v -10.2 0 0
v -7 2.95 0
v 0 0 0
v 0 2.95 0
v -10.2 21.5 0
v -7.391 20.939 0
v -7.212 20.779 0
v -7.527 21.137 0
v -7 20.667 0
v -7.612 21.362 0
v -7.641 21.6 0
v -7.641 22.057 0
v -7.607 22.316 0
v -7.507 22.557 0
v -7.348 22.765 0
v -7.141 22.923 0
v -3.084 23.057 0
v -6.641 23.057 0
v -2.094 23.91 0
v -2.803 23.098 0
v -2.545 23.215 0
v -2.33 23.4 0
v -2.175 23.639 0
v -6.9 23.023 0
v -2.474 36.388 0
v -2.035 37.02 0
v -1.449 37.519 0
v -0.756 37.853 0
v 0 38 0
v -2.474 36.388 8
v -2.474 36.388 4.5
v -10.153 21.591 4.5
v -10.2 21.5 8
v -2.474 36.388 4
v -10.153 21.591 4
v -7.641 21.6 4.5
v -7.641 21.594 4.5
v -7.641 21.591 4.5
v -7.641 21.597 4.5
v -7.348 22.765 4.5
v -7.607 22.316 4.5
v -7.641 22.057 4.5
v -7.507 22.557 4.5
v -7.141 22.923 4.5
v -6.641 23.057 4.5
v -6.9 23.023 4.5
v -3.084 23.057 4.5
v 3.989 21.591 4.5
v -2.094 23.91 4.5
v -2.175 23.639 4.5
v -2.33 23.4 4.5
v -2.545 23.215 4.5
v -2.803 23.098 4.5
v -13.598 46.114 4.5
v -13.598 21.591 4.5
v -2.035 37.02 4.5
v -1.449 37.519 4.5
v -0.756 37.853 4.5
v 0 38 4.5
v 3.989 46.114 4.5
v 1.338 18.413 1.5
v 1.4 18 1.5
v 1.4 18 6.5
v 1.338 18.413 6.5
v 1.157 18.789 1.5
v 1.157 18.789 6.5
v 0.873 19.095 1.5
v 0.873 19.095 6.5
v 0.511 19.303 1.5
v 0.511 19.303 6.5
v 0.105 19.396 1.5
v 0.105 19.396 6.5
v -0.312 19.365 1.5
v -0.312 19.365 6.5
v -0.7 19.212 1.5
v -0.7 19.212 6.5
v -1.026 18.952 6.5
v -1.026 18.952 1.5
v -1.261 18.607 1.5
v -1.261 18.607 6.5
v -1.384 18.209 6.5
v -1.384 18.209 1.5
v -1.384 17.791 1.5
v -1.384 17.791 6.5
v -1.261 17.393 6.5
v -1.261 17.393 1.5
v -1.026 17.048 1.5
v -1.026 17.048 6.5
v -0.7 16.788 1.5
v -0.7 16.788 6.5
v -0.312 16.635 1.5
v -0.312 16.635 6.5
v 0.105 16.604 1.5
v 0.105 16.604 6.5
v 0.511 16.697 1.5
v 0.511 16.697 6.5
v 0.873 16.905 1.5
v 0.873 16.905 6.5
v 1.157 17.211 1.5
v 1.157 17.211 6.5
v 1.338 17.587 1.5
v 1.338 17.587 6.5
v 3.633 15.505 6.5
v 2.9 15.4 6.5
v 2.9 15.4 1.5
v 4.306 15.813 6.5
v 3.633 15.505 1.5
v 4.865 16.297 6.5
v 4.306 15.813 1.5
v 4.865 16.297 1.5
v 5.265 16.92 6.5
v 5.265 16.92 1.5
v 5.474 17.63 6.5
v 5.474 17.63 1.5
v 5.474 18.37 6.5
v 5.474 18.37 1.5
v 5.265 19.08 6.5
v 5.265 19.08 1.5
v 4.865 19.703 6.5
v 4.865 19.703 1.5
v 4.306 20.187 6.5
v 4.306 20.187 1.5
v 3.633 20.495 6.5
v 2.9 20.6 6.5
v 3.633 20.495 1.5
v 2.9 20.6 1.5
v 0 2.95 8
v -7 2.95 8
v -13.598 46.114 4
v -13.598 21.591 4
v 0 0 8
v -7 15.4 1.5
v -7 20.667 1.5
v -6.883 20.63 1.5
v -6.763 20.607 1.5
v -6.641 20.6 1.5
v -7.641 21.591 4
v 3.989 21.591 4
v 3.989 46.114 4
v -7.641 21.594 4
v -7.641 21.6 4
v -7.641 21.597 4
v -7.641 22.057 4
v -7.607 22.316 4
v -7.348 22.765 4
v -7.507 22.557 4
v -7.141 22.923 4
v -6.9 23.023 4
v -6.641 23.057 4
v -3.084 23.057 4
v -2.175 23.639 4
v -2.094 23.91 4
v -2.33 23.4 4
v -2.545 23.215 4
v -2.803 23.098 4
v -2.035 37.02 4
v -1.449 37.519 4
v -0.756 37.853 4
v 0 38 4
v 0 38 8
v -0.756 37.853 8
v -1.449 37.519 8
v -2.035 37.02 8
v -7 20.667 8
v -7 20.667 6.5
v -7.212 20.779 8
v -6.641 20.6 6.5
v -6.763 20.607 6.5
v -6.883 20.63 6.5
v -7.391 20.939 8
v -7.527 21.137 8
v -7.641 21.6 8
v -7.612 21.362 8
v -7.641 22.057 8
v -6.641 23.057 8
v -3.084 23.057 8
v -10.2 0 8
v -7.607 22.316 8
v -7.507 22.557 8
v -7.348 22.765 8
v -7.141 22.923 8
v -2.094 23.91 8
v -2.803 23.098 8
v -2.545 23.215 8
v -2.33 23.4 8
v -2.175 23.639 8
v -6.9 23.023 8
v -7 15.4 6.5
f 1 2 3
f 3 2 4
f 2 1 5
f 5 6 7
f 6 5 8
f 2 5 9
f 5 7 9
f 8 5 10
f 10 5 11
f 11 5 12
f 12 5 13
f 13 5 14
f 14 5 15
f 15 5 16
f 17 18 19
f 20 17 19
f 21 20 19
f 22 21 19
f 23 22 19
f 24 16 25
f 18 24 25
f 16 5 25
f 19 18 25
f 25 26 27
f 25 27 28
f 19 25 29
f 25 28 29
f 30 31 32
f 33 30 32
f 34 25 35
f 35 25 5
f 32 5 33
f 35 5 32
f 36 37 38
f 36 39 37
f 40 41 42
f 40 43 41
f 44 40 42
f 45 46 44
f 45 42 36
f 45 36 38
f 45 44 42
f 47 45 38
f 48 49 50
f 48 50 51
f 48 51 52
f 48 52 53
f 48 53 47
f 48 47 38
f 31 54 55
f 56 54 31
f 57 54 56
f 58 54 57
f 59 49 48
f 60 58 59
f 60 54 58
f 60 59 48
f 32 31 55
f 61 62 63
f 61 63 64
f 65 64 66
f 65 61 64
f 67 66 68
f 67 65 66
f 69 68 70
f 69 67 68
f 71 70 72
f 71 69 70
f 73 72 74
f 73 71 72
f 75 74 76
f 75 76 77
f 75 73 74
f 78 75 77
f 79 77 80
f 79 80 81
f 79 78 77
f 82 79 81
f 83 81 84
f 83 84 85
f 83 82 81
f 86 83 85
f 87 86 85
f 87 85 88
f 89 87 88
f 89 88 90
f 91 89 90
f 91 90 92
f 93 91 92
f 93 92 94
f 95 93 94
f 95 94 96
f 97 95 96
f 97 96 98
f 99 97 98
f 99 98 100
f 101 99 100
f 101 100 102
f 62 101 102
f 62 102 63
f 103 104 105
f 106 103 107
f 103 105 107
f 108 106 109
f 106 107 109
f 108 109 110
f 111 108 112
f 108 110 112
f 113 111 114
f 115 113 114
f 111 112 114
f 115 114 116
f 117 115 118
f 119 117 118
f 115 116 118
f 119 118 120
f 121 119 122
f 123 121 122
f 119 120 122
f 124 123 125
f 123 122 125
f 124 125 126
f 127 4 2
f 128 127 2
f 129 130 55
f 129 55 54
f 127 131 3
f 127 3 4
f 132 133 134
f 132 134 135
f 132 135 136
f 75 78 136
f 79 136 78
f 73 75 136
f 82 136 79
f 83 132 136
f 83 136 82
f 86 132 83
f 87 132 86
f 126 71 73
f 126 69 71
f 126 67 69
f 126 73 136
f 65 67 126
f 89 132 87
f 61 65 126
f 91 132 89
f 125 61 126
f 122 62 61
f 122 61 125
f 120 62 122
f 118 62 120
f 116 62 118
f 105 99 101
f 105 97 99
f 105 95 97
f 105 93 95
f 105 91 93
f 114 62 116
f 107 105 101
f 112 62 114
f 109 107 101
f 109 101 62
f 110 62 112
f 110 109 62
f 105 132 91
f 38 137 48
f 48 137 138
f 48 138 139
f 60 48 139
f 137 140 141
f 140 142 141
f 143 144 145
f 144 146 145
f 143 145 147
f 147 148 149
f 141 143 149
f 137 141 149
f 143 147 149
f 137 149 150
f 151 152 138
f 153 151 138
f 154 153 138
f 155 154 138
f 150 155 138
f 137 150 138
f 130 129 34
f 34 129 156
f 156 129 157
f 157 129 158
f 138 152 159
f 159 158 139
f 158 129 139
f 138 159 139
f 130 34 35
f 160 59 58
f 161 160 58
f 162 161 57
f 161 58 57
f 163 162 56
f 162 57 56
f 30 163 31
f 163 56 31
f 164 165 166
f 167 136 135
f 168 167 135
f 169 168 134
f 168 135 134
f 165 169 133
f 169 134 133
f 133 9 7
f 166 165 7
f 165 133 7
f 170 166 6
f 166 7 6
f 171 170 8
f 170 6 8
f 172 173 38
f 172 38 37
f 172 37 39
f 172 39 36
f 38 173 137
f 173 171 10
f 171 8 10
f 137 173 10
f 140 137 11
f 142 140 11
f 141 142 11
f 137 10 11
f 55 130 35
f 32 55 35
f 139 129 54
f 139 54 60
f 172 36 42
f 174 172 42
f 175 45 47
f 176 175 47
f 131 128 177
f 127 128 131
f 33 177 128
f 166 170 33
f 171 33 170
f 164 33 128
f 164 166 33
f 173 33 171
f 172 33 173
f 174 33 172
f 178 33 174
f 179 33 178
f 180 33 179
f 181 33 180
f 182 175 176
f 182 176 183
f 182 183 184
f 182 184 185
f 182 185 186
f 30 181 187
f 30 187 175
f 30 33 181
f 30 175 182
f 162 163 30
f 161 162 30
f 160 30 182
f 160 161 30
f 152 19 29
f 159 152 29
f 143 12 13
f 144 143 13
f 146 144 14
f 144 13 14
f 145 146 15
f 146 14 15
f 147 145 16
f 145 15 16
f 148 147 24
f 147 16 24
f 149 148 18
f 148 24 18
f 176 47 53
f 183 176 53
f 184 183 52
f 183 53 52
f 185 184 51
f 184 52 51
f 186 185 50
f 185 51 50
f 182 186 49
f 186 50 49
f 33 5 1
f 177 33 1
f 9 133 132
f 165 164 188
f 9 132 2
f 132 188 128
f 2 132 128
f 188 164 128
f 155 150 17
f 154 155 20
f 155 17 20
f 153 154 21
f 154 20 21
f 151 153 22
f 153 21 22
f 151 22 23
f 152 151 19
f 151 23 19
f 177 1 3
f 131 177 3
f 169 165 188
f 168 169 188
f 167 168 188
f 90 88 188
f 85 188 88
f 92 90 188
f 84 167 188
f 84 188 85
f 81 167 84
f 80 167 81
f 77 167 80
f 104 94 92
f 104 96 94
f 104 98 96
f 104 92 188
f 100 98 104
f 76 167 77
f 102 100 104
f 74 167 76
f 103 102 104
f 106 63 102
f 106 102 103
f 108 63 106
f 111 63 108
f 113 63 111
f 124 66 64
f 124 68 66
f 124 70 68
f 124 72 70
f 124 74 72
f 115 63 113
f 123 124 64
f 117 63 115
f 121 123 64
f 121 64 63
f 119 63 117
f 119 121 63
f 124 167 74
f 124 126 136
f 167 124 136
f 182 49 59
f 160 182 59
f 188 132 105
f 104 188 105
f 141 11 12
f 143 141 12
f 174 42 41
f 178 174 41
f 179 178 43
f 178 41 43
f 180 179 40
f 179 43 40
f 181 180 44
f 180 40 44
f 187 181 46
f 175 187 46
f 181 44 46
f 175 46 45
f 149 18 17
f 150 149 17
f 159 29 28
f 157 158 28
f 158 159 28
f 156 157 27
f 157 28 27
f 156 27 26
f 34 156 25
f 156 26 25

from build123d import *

# Parameters (mm, degrees)
F0_R     = 1.4
F1_DEPTH = 8
F3_W     = 17.5872370601
F3_H     = 24.5230514556
F4_DEPTH = 0.5
F5_R     = 1.4
F6_DEPTH = 1.5
F7_R     = 1.4
F8_DEPTH = 1.5


with BuildPart() as f1:
    # F0 (on Top) → F1 (new body)
    with BuildSketch(Plane.XY):
        with BuildLine():
            Line((-10.2, 0), (0, 0))
            Line((0, 0), (0, 2.95))
            Line((0, 2.95), (-7, 2.95))
            Line((-7, 2.95), (-7, 15.4))
            Line((-7, 15.4), (2.9, 15.4))
            ThreePointArc((2.9, 15.4), (5.5, 18), (2.9, 20.6))
            Line((2.9, 20.6), (-6.6411852492, 20.6))
            ThreePointArc((-6.6411852492, 20.6), (-7.3482920304, 20.8928932188), (-7.6411852492, 21.6))
            Line((-7.6411852492, 21.6), (-7.6411852492, 22.0574738234))
            ThreePointArc((-7.6411852492, 22.0574738234), (-7.3482920304, 22.7645806046), (-6.6411852492, 23.0574738234))
            Line((-6.6411852492, 23.0574738234), (-3.0835396533, 23.0574738234))
            ThreePointArc((-3.0835396533, 23.0574738234), (-2.4304830107, 23.3001647574), (-2.0944082211, 23.9104397804))
            Line((-2.0944082211, 23.9104397804), (0, 38))
            ThreePointArc((0, 38), (-1.4489432485, 37.5193323495), (-2.4737455949, 36.3878474497))
            Line((-2.4737455949, 36.3878474497), (-10.2, 21.5))
            Line((-10.2, 21.5), (-10.2, 2.95))
            Line((-10.2, 2.95), (-10.2, 0))
        make_face()
        with Locations((0, 18)):
            Circle(F0_R, mode=Mode.SUBTRACT)
    extrude(amount=F1_DEPTH)

    # F3 (on mid) → F4 (join)
    with BuildSketch(Plane.XY.offset(4)):
        with Locations((-4.8047471792, 33.8525986299)):
            Rectangle(F3_W, F3_H)
    extrude(amount=F4_DEPTH)

    # F5 (on face) → F6 (cut)
    with BuildSketch(Plane.XY.offset(8)):
        with BuildLine():
            Line((-7, 20.6665912071), (-7, 15.4))
            Line((-7, 15.4), (2.9, 15.4))
            ThreePointArc((2.9, 15.4), (5.5, 18), (2.9, 20.6))
            Line((2.9, 20.6), (-6.6411852492, 20.6))
            ThreePointArc((-6.6411852492, 20.6), (-6.8236560785, 20.6167887326), (-7, 20.6665912071))
        make_face()
        with Locations((0, 18)):
            Circle(F5_R, mode=Mode.SUBTRACT)
    extrude(amount=-F6_DEPTH, mode=Mode.SUBTRACT)

    # F7 (on face) → F8 (cut)
    with BuildSketch(Plane(origin=(0, 0, 0), x_dir=(1, 0, 0), z_dir=(0, 0, -1))):
        with BuildLine():
            Line((2.9, -15.4), (-7, -15.4))
            Line((-7, -15.4), (-7, -20.6665912071))
            ThreePointArc((-7, -20.6665912071), (-6.8236560785, -20.6167887326), (-6.6411852492, -20.6))
            Line((-6.6411852492, -20.6), (2.9, -20.6))
            ThreePointArc((2.9, -20.6), (5.5, -18), (2.9, -15.4))
        make_face()
        with Locations((0, -18)):
            Circle(F7_R, mode=Mode.SUBTRACT)
    extrude(amount=-F8_DEPTH, mode=Mode.SUBTRACT)


solid = f1.part
